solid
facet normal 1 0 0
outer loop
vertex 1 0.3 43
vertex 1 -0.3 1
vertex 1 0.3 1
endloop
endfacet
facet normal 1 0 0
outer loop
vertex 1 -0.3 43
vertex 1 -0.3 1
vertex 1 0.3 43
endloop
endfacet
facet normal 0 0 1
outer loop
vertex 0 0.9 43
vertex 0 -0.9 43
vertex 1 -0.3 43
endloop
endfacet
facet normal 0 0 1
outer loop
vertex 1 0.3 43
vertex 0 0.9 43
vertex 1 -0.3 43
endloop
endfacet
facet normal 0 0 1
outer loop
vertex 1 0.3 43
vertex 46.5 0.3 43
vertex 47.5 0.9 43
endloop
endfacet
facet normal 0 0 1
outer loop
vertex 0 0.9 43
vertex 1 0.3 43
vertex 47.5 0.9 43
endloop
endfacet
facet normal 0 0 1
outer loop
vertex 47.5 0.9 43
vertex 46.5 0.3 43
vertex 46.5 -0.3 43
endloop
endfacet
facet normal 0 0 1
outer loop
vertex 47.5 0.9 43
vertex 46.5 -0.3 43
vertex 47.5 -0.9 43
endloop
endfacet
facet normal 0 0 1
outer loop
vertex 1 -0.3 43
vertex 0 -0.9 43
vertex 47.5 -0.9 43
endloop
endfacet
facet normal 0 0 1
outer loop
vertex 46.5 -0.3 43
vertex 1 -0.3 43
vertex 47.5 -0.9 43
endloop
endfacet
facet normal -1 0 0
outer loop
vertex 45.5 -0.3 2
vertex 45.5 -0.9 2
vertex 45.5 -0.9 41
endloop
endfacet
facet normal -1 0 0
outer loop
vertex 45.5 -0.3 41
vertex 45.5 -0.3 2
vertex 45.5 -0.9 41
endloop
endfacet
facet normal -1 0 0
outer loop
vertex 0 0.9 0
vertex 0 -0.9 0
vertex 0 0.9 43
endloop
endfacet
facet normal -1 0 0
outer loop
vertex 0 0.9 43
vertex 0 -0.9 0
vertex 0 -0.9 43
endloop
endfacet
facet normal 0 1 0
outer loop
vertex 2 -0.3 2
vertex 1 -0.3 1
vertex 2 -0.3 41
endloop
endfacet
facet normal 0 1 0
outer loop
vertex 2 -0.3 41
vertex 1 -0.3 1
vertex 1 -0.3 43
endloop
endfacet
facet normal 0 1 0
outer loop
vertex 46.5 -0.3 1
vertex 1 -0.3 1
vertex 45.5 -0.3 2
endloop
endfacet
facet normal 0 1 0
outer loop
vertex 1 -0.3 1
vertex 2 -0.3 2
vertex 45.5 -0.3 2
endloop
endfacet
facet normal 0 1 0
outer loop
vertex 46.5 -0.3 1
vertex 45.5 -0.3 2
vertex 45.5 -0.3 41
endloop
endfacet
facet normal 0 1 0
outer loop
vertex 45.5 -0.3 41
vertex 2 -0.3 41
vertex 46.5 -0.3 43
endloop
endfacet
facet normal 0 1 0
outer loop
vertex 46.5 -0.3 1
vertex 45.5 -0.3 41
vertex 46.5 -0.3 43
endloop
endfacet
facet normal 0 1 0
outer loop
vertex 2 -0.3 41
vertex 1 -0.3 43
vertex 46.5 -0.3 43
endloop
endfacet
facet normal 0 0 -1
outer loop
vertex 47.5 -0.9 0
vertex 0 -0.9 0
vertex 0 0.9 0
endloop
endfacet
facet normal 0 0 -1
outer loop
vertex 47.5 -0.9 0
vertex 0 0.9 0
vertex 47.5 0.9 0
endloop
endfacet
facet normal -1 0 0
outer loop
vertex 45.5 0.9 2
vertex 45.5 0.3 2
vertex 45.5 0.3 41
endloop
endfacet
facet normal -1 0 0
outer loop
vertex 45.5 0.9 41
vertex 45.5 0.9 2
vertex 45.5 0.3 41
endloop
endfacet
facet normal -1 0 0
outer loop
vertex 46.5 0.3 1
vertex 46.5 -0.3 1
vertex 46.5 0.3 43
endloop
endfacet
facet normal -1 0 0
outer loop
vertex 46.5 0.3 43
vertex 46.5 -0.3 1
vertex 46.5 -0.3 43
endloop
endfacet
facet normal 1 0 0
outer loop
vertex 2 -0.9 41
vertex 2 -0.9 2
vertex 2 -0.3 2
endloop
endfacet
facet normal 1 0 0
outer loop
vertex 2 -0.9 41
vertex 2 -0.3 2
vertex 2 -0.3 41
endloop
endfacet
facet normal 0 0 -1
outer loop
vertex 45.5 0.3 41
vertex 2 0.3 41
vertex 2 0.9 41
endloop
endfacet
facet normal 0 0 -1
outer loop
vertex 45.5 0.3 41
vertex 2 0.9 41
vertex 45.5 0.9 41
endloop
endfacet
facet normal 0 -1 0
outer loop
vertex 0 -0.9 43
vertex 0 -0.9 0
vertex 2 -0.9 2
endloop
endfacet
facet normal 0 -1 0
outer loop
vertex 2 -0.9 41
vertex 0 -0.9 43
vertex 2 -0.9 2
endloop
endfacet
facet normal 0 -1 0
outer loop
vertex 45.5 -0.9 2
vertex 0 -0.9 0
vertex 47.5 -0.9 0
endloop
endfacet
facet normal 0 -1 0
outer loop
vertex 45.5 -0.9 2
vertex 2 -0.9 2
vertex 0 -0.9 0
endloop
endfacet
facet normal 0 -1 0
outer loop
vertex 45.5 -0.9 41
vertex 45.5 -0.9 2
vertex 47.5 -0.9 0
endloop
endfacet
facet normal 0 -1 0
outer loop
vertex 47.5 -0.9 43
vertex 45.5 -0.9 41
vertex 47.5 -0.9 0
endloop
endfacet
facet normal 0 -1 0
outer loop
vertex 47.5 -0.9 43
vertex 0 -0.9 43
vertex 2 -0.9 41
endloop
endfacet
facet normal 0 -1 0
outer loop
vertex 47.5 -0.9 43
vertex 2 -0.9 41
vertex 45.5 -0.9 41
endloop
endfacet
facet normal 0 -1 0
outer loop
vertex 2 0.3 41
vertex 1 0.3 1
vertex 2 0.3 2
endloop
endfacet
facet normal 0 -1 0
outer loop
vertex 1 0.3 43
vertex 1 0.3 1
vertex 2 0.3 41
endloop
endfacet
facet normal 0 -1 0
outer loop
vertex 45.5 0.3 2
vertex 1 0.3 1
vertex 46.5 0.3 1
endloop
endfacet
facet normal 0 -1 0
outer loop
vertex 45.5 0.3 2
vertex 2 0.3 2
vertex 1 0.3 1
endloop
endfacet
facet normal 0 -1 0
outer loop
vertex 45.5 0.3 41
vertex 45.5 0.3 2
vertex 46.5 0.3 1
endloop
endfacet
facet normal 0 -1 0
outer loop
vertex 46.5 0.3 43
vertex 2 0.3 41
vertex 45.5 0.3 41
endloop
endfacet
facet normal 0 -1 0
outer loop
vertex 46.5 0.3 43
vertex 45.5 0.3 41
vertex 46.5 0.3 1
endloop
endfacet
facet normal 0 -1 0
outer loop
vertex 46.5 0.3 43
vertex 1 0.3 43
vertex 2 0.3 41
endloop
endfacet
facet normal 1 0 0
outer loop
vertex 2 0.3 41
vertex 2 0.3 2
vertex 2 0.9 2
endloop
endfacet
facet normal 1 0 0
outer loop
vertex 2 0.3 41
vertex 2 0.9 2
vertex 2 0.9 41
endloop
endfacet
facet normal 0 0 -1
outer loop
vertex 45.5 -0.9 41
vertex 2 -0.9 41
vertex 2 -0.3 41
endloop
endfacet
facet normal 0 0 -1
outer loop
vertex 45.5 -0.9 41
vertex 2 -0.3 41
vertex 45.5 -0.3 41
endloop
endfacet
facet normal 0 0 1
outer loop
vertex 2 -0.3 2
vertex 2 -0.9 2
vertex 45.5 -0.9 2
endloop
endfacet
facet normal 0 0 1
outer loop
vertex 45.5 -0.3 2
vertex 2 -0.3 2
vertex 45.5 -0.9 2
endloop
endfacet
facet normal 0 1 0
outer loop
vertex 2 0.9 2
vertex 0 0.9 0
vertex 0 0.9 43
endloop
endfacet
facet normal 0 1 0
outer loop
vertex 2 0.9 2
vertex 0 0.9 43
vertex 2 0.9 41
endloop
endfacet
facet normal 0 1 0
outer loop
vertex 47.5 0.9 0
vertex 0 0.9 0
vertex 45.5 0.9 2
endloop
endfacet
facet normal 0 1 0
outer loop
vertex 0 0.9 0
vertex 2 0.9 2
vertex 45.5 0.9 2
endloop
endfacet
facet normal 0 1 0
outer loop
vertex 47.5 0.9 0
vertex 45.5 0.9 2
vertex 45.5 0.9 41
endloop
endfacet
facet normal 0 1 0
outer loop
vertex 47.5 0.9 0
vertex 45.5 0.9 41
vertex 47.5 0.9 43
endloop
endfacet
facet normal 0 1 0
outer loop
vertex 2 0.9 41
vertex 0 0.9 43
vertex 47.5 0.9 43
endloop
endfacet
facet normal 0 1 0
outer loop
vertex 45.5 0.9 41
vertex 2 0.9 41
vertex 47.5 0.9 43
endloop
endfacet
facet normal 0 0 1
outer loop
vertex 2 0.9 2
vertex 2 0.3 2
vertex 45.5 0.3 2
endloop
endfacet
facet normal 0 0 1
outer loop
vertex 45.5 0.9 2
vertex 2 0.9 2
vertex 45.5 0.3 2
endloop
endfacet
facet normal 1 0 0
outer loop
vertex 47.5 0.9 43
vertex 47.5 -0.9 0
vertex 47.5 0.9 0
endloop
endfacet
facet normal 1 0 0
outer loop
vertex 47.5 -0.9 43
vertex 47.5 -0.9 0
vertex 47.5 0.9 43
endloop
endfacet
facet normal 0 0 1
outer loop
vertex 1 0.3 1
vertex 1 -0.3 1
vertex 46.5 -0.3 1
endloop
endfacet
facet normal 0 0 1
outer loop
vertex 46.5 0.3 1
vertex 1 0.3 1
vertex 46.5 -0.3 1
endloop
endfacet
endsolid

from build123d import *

# Parameters (mm, degrees)
F0_W     = 47.5
F0_H     = 43
F1_DEPTH = 0.9
F2_W     = 43.5
F2_H     = 39
F3_DEPTH = 1
F4_W     = 45.5
F4_H     = 42
F5_DEPTH = 0.3


with BuildPart() as f1:
    # F0 (on Front) → F1 (new body, symmetric)
    with BuildSketch(Plane.XZ):
        with Locations((23.75, 21.5)):
            Rectangle(F0_W, F0_H)
    extrude(amount=F1_DEPTH, both=True)

    # F2 (on Front) → F3 (cut, symmetric)
    with BuildSketch(Plane.XZ):
        with Locations((23.75, 21.5)):
            Rectangle(F2_W, F2_H)
    extrude(amount=F3_DEPTH, both=True, mode=Mode.SUBTRACT)

    # F4 (on Front) → F5 (cut, symmetric)
    with BuildSketch(Plane.XZ):
        with Locations((23.75, 22)):
            Rectangle(F4_W, F4_H)
    extrude(amount=F5_DEPTH, both=True, mode=Mode.SUBTRACT)


solid = f1.part
